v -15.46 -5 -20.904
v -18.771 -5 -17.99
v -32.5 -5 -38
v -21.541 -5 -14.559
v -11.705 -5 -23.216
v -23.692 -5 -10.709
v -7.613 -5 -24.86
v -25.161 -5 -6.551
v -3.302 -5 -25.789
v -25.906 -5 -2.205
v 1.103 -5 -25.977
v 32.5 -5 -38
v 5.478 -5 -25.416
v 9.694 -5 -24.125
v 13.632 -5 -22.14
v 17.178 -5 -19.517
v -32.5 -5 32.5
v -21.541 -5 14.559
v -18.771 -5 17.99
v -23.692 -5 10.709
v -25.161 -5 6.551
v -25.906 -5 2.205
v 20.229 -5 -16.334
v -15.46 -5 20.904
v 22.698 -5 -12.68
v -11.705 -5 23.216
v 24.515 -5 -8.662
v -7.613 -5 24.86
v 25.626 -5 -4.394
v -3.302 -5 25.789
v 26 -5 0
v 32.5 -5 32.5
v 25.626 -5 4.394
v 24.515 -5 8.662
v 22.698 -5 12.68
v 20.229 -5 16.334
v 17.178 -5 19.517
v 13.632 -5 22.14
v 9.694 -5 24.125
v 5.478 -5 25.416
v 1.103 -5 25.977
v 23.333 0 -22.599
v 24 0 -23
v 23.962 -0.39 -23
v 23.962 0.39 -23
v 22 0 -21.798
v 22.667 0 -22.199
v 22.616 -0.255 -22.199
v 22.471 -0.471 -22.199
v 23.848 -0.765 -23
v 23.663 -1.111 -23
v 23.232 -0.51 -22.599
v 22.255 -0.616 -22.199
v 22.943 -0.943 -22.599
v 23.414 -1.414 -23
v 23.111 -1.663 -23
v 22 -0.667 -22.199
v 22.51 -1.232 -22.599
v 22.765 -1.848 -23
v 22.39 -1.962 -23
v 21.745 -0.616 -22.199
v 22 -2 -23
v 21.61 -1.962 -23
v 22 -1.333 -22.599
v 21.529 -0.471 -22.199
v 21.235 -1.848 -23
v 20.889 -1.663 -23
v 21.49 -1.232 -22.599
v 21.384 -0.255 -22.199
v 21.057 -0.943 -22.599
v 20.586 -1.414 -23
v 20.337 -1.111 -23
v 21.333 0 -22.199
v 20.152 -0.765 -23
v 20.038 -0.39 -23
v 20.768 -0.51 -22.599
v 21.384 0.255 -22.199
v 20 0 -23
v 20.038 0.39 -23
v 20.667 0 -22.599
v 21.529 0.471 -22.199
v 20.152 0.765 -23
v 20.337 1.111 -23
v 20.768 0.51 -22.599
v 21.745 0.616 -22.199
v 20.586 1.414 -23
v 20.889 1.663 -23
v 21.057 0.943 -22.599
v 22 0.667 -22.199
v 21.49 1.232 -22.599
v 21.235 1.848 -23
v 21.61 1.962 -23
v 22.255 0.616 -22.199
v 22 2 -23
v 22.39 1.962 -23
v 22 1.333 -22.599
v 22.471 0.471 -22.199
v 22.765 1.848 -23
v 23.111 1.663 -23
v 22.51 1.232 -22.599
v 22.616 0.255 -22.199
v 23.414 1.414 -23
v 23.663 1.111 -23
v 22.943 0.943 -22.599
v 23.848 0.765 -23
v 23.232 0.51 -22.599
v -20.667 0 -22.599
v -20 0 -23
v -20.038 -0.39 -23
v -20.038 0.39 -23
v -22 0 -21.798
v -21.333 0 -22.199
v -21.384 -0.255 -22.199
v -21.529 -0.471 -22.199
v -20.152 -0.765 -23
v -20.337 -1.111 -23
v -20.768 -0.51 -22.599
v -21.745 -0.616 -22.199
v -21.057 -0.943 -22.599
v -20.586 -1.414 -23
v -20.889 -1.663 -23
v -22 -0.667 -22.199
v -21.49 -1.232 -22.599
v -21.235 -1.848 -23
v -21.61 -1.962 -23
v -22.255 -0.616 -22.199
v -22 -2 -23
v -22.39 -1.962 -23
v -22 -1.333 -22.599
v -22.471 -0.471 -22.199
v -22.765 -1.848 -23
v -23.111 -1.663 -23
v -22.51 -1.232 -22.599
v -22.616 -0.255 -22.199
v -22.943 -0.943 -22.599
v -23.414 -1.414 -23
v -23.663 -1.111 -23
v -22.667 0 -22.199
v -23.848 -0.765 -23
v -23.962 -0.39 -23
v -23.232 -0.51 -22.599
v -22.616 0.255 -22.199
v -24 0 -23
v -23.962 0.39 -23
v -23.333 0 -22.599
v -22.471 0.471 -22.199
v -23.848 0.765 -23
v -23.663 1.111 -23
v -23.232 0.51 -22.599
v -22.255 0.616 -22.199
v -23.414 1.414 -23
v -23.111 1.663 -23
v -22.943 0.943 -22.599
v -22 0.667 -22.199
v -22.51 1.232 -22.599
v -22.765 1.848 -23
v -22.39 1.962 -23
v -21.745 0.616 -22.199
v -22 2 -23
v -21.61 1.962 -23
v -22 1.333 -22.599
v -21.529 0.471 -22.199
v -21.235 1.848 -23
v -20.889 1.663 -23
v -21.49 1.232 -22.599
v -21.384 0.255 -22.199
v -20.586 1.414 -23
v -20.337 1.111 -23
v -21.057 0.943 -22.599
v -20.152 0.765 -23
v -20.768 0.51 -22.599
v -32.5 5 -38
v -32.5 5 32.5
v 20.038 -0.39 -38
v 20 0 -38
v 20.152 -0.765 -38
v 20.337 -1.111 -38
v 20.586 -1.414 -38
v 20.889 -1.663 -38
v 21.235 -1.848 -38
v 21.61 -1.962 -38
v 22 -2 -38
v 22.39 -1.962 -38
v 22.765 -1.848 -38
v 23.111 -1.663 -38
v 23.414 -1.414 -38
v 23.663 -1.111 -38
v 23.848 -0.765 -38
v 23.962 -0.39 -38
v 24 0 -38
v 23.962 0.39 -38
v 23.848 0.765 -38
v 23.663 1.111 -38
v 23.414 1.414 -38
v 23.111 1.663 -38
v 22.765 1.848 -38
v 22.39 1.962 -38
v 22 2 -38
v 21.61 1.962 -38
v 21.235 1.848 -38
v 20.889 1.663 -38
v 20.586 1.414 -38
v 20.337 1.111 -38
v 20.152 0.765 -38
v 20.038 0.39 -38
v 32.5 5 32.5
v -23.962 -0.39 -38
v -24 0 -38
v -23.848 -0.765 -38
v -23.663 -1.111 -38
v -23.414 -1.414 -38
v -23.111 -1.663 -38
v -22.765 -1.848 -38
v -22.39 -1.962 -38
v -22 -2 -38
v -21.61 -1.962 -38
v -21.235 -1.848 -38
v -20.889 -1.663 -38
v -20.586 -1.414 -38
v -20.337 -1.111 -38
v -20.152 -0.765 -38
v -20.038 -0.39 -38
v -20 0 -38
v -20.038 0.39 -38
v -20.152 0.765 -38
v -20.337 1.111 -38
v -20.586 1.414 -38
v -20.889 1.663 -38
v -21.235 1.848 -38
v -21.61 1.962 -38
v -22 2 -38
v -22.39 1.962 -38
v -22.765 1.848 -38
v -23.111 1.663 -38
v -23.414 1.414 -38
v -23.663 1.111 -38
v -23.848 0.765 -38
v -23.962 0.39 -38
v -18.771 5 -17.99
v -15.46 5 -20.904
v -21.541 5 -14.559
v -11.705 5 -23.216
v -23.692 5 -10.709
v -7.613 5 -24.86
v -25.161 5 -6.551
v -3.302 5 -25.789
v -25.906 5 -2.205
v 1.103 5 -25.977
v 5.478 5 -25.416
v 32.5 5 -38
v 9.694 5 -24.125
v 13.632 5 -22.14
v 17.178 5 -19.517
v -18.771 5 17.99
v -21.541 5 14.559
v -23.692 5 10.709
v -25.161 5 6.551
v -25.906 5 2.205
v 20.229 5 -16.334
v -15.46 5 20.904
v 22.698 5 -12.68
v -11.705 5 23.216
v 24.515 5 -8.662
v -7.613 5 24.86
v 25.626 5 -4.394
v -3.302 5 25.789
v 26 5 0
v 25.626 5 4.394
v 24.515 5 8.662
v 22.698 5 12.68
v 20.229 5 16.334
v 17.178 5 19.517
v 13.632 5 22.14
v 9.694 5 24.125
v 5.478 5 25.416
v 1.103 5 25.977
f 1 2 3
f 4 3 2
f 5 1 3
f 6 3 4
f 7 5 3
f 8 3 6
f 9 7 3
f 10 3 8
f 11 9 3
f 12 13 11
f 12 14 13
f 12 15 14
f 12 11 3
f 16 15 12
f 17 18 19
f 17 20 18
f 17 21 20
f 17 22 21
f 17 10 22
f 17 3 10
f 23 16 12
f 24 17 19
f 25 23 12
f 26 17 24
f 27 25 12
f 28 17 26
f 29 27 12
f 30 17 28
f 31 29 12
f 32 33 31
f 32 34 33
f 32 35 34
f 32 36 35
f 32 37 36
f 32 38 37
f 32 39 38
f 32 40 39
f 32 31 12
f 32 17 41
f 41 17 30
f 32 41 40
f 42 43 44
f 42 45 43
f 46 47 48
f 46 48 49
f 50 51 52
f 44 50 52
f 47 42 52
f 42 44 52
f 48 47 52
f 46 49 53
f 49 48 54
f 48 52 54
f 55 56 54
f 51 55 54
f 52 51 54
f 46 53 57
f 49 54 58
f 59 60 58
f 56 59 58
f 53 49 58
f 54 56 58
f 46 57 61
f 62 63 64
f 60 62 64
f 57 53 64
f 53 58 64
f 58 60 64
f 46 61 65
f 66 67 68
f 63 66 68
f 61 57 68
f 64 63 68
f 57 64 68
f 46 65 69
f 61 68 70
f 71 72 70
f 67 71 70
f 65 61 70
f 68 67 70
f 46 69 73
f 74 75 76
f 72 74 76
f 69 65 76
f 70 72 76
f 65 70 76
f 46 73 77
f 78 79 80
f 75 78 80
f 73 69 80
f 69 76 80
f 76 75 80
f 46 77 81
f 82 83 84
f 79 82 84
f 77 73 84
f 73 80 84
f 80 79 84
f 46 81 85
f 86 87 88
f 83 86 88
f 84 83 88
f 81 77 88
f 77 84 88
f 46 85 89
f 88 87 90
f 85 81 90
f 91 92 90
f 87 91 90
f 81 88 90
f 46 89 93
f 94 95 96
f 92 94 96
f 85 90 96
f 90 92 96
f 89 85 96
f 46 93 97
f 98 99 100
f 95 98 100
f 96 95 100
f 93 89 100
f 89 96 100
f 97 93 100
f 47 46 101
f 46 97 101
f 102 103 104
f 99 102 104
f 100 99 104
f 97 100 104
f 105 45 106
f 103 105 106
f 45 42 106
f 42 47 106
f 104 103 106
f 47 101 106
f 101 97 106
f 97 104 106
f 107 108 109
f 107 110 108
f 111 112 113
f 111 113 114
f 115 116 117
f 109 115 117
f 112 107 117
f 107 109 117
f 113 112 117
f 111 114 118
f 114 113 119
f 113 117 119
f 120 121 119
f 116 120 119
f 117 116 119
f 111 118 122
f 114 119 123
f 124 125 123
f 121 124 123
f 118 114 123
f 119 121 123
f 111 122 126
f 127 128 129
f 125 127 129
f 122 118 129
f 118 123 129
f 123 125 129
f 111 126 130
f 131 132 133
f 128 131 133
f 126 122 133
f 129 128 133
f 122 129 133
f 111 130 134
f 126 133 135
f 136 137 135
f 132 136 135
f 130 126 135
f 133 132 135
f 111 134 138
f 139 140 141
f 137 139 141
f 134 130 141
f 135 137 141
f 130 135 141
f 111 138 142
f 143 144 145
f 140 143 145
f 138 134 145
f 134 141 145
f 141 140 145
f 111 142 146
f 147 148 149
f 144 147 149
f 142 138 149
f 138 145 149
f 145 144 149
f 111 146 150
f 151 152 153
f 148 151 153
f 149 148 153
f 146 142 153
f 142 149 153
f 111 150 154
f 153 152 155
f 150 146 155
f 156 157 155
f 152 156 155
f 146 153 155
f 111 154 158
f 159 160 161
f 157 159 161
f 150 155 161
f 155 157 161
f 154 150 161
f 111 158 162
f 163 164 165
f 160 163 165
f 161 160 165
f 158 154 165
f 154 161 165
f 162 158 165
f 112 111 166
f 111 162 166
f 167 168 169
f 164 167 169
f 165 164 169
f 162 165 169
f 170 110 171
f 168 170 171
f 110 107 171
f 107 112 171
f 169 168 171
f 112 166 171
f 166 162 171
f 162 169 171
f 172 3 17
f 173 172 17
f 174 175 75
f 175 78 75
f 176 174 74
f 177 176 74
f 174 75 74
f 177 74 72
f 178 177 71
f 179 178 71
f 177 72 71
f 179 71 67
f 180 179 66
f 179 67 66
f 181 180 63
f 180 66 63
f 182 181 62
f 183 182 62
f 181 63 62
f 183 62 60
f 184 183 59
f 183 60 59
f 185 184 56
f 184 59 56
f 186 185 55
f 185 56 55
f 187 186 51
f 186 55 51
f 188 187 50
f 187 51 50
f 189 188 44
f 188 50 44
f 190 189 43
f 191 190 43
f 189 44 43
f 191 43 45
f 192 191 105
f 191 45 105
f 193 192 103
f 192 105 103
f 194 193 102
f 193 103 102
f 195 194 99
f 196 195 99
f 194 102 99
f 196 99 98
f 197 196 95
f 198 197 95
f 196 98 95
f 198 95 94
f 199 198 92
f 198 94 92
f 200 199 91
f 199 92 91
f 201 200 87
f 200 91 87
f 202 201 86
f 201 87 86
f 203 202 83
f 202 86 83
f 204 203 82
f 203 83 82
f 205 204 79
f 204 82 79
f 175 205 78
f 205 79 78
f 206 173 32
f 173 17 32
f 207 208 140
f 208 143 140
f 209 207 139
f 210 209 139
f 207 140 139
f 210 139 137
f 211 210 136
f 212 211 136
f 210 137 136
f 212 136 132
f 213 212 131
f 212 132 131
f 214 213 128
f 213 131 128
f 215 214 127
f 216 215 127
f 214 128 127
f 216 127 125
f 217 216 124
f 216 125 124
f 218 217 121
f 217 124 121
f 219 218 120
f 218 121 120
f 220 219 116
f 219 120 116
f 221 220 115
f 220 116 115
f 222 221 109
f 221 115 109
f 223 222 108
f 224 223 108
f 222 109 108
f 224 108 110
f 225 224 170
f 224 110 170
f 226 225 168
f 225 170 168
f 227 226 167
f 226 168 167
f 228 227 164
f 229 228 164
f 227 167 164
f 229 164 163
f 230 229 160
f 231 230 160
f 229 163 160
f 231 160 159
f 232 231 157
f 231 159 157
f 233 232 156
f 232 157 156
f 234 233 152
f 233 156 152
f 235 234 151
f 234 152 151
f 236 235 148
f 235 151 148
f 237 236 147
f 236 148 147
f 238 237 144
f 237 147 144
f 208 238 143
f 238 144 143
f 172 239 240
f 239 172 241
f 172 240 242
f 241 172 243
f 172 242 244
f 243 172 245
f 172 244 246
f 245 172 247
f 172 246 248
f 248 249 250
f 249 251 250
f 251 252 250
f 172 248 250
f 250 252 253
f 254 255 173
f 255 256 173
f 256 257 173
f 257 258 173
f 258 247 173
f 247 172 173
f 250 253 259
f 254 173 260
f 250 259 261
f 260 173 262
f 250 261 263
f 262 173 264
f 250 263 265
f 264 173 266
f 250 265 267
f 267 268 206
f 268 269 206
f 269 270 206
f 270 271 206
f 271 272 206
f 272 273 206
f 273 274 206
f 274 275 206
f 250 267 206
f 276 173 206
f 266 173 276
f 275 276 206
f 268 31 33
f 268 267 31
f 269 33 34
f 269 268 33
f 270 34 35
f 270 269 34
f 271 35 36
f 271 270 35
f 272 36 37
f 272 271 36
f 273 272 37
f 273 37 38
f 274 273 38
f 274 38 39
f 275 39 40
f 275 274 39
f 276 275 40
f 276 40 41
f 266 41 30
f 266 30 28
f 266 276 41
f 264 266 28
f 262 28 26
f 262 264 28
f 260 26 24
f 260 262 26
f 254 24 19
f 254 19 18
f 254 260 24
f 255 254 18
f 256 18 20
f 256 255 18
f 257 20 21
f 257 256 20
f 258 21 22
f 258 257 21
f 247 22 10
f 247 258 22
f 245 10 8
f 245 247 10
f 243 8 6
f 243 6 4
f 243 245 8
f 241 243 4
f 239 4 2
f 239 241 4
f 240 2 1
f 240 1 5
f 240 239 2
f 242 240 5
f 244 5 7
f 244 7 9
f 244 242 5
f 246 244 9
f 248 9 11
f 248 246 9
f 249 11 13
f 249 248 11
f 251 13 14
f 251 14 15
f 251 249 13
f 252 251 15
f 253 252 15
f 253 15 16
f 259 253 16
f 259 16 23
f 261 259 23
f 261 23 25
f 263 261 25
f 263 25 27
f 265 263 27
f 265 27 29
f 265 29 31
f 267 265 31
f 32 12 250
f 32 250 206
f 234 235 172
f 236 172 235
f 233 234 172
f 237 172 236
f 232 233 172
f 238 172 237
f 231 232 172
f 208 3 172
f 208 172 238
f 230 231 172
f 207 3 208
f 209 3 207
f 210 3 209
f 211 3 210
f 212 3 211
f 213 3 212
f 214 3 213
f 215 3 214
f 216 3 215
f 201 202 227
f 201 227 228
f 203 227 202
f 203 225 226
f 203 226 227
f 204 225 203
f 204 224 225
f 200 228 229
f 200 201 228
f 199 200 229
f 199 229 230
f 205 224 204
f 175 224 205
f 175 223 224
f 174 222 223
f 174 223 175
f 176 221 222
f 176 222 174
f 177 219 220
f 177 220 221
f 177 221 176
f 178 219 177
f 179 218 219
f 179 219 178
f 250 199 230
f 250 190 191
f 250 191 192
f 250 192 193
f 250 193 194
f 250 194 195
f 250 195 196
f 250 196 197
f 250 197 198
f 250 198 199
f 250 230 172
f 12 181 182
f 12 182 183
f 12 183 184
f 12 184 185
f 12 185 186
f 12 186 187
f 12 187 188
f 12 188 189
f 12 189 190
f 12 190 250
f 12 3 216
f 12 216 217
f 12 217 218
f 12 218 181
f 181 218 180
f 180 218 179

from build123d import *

# Parameters (mm, degrees)
F0_W     = 65
F0_H     = 70.5
F0_R     = 26
F1_DEPTH = 5
F3_D     = 4
F3_DEPTH = 15
F3_TIP   = 1.2017212381


with BuildPart() as f1:
    # F0 (on Front) → F1 (new body, symmetric)
    with BuildSketch(Plane.XZ):
        with Locations((0, -2.75)):
            Rectangle(F0_W, F0_H)
        Circle(F0_R, mode=Mode.SUBTRACT)
    extrude(amount=F1_DEPTH, both=True)

    # F3
    with Locations(Plane(origin=(0, 0, -38), x_dir=(1, 0, 0), z_dir=(0, 0, -1))):
        with Locations((-22, 0), (22, 0)):
            Hole(F3_D / 2, depth=F3_DEPTH)
            with Locations((0, 0, -(F3_DEPTH + F3_TIP / 2))):  # 118° drill point
                Cone(0, F3_D / 2, F3_TIP, mode=Mode.SUBTRACT)


solid = f1.part
